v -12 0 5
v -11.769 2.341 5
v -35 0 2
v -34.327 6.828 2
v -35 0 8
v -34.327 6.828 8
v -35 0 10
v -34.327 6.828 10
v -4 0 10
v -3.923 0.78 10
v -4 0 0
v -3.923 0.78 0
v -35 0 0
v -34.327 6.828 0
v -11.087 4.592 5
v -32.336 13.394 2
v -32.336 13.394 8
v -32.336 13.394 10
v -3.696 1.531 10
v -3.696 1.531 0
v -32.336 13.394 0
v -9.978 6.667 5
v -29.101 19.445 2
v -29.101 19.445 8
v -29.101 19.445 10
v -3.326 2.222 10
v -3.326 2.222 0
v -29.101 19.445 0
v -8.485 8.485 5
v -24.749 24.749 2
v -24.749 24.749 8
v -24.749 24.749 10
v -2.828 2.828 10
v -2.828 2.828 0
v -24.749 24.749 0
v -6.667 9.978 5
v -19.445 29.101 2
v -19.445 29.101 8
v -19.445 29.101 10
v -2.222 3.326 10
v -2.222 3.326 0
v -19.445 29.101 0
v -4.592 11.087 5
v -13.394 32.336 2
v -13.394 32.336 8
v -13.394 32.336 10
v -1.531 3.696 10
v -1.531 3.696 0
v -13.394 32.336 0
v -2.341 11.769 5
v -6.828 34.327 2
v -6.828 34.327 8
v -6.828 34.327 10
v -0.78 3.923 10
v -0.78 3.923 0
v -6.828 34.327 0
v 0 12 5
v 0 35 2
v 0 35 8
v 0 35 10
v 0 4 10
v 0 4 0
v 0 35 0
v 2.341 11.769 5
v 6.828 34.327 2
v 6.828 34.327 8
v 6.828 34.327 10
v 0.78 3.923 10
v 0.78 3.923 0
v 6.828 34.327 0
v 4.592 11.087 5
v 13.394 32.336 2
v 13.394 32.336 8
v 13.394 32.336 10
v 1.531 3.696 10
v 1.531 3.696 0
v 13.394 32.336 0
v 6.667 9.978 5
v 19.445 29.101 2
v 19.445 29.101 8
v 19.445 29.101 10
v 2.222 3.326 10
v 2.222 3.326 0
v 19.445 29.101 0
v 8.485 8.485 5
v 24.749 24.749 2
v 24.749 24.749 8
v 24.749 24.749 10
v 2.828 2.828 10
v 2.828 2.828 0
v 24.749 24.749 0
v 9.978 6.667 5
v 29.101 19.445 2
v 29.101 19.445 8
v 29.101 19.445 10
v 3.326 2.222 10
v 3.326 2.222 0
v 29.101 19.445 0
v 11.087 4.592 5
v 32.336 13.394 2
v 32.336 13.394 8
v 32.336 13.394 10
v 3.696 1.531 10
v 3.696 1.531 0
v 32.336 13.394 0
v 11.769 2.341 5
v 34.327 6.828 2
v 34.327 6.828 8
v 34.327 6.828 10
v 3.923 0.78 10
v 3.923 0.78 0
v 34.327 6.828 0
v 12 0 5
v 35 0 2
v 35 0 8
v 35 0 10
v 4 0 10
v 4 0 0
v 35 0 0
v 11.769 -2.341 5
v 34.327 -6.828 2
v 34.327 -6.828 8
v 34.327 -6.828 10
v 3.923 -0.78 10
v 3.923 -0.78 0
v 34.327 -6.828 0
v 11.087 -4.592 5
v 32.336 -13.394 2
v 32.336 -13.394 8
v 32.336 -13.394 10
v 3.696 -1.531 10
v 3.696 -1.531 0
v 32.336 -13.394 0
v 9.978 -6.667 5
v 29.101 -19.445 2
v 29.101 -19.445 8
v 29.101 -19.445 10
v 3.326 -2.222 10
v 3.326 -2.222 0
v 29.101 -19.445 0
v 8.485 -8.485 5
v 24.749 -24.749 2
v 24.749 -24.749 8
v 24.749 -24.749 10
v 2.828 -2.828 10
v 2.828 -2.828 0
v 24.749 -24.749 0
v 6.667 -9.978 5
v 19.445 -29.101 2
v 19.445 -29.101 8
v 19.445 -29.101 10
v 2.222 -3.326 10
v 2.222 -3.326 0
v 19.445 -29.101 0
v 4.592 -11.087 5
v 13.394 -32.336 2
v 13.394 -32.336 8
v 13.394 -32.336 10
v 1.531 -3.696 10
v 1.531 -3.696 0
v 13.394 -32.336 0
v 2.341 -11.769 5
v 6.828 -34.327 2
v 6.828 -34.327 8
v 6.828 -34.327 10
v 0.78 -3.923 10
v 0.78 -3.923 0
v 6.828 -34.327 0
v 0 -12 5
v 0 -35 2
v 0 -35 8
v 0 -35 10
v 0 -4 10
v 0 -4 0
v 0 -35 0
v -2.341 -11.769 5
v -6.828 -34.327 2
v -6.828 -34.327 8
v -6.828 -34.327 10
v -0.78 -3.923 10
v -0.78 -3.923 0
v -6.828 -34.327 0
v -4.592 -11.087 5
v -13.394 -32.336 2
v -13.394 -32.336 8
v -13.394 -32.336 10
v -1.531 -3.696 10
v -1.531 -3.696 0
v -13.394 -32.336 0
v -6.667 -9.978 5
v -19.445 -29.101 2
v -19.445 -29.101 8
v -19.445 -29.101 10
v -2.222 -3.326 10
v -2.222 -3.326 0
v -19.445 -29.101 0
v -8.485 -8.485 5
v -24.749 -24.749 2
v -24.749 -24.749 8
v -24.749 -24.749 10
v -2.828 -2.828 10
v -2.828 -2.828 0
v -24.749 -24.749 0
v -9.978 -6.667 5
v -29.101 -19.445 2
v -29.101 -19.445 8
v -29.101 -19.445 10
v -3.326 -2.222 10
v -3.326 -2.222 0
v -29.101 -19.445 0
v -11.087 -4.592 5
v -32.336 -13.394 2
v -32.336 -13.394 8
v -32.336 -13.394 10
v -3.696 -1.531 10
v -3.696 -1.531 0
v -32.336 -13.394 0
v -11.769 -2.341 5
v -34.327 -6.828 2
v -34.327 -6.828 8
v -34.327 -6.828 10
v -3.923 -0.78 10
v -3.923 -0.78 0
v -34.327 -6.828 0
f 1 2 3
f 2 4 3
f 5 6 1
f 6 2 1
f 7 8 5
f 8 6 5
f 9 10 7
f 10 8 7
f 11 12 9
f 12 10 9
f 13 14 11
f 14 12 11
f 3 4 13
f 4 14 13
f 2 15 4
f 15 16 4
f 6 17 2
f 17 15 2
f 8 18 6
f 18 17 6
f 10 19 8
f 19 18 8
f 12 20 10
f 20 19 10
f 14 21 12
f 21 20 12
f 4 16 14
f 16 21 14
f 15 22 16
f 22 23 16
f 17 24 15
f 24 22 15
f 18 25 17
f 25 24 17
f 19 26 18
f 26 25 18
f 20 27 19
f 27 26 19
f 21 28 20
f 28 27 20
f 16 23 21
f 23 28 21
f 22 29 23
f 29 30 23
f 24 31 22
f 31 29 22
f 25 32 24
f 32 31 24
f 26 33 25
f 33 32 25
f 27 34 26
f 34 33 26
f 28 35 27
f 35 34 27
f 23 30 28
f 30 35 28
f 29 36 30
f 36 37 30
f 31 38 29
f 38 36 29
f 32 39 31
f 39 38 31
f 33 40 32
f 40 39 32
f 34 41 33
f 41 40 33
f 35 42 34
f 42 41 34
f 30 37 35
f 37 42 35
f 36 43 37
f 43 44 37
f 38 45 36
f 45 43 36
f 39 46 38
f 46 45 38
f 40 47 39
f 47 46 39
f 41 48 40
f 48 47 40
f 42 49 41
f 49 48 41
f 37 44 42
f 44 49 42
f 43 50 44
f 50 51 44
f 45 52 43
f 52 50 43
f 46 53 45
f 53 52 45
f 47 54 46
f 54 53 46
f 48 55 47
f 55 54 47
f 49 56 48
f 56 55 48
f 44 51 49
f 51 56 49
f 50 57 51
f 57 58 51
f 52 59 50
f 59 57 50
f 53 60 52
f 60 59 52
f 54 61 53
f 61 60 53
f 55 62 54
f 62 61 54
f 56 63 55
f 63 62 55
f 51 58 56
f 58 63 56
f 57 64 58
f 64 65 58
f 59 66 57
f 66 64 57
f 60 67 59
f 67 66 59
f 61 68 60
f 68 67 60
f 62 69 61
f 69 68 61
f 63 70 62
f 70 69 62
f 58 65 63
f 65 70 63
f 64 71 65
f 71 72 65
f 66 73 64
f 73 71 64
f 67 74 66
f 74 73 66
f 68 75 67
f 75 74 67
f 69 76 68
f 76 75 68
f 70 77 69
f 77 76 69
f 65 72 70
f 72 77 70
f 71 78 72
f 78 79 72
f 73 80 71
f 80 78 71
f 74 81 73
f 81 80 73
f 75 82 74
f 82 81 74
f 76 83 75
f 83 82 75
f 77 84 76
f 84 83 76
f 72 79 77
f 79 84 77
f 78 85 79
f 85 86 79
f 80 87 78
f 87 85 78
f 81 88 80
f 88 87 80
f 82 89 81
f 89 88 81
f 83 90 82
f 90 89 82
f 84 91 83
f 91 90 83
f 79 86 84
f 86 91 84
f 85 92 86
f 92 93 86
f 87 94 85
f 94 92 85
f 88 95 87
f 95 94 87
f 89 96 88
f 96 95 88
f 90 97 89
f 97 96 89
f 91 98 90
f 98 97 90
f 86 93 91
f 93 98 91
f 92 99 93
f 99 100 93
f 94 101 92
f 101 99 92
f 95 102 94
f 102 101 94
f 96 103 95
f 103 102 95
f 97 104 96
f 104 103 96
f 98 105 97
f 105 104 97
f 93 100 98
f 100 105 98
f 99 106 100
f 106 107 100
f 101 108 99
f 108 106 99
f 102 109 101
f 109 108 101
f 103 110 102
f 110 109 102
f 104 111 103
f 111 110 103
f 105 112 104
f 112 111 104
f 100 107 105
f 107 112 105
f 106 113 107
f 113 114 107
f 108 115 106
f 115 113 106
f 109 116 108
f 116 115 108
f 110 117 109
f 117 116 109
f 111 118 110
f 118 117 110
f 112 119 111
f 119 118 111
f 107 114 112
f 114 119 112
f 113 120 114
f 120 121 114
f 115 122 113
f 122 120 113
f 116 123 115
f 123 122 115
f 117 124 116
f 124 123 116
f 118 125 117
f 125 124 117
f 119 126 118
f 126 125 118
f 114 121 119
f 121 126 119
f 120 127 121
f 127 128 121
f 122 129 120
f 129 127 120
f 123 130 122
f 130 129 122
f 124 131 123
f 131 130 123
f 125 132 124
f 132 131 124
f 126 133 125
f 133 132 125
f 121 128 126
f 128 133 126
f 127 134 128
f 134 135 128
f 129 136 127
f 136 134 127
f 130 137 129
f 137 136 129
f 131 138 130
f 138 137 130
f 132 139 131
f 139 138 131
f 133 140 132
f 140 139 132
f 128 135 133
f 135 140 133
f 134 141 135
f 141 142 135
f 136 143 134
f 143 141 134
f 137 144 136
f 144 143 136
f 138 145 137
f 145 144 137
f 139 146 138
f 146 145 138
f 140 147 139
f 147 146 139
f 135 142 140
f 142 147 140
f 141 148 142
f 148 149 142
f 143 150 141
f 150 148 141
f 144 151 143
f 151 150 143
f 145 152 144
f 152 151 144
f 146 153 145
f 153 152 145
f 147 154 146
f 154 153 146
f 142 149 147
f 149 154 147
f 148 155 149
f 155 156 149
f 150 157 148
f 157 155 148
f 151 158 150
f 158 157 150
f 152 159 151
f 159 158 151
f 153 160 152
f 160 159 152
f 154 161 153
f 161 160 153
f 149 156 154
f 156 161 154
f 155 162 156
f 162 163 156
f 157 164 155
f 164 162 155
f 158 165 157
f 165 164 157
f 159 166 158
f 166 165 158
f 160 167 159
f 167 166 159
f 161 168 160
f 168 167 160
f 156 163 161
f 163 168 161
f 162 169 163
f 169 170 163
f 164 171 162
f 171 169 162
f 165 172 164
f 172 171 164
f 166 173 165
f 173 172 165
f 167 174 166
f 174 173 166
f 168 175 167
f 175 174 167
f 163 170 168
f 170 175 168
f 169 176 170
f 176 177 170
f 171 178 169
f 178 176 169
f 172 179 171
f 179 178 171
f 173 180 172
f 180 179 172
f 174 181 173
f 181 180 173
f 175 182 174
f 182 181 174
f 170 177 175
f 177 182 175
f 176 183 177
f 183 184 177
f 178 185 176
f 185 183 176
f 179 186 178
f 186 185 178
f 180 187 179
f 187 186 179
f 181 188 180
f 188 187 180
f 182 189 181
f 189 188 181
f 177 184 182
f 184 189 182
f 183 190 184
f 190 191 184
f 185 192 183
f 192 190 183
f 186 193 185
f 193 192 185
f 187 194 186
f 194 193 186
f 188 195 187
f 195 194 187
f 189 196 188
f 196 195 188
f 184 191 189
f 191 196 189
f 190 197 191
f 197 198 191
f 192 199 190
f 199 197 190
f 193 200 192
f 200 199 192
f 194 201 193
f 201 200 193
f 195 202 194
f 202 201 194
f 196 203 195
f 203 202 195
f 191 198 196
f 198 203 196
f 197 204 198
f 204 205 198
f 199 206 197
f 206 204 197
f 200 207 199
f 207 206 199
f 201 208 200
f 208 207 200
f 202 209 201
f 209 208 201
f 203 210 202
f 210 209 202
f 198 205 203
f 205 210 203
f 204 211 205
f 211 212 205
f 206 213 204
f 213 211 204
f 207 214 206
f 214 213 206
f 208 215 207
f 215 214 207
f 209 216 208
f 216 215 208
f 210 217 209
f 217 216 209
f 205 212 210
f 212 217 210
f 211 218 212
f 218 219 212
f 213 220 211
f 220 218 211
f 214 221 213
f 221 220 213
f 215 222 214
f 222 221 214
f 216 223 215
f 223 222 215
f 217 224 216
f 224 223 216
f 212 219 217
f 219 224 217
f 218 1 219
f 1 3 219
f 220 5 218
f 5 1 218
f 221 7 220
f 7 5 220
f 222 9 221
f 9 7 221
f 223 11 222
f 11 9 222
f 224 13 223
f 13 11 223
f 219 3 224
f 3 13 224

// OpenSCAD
$fn = 32;

// ----------------------------------------------------------------------
// Revolved part: V-groove pulley R35
// ----------------------------------------------------------------------

// --- parameters (mm) ---
bore_r = 4;               // bore radius
rim_r = 35;               // rim radius
rim_t = 10;               // rim width
groove_r = 12;            // groove root radius
groove_w = 3;             // groove half width
revolve_angle = 360;      // revolve sweep, degrees

bore_d = 2 * bore_r;
rim_d = 2 * rim_r;
groove_d = 2 * groove_r;

profile = [[4, 0], [35, 0], [35, 2], [12, 5], [35, 8], [35, 10], [4, 10]];  // primary outline, 7 points, counter clockwise

// --- the one profile operation ---
rotate_extrude(angle = revolve_angle) polygon(points = profile);
